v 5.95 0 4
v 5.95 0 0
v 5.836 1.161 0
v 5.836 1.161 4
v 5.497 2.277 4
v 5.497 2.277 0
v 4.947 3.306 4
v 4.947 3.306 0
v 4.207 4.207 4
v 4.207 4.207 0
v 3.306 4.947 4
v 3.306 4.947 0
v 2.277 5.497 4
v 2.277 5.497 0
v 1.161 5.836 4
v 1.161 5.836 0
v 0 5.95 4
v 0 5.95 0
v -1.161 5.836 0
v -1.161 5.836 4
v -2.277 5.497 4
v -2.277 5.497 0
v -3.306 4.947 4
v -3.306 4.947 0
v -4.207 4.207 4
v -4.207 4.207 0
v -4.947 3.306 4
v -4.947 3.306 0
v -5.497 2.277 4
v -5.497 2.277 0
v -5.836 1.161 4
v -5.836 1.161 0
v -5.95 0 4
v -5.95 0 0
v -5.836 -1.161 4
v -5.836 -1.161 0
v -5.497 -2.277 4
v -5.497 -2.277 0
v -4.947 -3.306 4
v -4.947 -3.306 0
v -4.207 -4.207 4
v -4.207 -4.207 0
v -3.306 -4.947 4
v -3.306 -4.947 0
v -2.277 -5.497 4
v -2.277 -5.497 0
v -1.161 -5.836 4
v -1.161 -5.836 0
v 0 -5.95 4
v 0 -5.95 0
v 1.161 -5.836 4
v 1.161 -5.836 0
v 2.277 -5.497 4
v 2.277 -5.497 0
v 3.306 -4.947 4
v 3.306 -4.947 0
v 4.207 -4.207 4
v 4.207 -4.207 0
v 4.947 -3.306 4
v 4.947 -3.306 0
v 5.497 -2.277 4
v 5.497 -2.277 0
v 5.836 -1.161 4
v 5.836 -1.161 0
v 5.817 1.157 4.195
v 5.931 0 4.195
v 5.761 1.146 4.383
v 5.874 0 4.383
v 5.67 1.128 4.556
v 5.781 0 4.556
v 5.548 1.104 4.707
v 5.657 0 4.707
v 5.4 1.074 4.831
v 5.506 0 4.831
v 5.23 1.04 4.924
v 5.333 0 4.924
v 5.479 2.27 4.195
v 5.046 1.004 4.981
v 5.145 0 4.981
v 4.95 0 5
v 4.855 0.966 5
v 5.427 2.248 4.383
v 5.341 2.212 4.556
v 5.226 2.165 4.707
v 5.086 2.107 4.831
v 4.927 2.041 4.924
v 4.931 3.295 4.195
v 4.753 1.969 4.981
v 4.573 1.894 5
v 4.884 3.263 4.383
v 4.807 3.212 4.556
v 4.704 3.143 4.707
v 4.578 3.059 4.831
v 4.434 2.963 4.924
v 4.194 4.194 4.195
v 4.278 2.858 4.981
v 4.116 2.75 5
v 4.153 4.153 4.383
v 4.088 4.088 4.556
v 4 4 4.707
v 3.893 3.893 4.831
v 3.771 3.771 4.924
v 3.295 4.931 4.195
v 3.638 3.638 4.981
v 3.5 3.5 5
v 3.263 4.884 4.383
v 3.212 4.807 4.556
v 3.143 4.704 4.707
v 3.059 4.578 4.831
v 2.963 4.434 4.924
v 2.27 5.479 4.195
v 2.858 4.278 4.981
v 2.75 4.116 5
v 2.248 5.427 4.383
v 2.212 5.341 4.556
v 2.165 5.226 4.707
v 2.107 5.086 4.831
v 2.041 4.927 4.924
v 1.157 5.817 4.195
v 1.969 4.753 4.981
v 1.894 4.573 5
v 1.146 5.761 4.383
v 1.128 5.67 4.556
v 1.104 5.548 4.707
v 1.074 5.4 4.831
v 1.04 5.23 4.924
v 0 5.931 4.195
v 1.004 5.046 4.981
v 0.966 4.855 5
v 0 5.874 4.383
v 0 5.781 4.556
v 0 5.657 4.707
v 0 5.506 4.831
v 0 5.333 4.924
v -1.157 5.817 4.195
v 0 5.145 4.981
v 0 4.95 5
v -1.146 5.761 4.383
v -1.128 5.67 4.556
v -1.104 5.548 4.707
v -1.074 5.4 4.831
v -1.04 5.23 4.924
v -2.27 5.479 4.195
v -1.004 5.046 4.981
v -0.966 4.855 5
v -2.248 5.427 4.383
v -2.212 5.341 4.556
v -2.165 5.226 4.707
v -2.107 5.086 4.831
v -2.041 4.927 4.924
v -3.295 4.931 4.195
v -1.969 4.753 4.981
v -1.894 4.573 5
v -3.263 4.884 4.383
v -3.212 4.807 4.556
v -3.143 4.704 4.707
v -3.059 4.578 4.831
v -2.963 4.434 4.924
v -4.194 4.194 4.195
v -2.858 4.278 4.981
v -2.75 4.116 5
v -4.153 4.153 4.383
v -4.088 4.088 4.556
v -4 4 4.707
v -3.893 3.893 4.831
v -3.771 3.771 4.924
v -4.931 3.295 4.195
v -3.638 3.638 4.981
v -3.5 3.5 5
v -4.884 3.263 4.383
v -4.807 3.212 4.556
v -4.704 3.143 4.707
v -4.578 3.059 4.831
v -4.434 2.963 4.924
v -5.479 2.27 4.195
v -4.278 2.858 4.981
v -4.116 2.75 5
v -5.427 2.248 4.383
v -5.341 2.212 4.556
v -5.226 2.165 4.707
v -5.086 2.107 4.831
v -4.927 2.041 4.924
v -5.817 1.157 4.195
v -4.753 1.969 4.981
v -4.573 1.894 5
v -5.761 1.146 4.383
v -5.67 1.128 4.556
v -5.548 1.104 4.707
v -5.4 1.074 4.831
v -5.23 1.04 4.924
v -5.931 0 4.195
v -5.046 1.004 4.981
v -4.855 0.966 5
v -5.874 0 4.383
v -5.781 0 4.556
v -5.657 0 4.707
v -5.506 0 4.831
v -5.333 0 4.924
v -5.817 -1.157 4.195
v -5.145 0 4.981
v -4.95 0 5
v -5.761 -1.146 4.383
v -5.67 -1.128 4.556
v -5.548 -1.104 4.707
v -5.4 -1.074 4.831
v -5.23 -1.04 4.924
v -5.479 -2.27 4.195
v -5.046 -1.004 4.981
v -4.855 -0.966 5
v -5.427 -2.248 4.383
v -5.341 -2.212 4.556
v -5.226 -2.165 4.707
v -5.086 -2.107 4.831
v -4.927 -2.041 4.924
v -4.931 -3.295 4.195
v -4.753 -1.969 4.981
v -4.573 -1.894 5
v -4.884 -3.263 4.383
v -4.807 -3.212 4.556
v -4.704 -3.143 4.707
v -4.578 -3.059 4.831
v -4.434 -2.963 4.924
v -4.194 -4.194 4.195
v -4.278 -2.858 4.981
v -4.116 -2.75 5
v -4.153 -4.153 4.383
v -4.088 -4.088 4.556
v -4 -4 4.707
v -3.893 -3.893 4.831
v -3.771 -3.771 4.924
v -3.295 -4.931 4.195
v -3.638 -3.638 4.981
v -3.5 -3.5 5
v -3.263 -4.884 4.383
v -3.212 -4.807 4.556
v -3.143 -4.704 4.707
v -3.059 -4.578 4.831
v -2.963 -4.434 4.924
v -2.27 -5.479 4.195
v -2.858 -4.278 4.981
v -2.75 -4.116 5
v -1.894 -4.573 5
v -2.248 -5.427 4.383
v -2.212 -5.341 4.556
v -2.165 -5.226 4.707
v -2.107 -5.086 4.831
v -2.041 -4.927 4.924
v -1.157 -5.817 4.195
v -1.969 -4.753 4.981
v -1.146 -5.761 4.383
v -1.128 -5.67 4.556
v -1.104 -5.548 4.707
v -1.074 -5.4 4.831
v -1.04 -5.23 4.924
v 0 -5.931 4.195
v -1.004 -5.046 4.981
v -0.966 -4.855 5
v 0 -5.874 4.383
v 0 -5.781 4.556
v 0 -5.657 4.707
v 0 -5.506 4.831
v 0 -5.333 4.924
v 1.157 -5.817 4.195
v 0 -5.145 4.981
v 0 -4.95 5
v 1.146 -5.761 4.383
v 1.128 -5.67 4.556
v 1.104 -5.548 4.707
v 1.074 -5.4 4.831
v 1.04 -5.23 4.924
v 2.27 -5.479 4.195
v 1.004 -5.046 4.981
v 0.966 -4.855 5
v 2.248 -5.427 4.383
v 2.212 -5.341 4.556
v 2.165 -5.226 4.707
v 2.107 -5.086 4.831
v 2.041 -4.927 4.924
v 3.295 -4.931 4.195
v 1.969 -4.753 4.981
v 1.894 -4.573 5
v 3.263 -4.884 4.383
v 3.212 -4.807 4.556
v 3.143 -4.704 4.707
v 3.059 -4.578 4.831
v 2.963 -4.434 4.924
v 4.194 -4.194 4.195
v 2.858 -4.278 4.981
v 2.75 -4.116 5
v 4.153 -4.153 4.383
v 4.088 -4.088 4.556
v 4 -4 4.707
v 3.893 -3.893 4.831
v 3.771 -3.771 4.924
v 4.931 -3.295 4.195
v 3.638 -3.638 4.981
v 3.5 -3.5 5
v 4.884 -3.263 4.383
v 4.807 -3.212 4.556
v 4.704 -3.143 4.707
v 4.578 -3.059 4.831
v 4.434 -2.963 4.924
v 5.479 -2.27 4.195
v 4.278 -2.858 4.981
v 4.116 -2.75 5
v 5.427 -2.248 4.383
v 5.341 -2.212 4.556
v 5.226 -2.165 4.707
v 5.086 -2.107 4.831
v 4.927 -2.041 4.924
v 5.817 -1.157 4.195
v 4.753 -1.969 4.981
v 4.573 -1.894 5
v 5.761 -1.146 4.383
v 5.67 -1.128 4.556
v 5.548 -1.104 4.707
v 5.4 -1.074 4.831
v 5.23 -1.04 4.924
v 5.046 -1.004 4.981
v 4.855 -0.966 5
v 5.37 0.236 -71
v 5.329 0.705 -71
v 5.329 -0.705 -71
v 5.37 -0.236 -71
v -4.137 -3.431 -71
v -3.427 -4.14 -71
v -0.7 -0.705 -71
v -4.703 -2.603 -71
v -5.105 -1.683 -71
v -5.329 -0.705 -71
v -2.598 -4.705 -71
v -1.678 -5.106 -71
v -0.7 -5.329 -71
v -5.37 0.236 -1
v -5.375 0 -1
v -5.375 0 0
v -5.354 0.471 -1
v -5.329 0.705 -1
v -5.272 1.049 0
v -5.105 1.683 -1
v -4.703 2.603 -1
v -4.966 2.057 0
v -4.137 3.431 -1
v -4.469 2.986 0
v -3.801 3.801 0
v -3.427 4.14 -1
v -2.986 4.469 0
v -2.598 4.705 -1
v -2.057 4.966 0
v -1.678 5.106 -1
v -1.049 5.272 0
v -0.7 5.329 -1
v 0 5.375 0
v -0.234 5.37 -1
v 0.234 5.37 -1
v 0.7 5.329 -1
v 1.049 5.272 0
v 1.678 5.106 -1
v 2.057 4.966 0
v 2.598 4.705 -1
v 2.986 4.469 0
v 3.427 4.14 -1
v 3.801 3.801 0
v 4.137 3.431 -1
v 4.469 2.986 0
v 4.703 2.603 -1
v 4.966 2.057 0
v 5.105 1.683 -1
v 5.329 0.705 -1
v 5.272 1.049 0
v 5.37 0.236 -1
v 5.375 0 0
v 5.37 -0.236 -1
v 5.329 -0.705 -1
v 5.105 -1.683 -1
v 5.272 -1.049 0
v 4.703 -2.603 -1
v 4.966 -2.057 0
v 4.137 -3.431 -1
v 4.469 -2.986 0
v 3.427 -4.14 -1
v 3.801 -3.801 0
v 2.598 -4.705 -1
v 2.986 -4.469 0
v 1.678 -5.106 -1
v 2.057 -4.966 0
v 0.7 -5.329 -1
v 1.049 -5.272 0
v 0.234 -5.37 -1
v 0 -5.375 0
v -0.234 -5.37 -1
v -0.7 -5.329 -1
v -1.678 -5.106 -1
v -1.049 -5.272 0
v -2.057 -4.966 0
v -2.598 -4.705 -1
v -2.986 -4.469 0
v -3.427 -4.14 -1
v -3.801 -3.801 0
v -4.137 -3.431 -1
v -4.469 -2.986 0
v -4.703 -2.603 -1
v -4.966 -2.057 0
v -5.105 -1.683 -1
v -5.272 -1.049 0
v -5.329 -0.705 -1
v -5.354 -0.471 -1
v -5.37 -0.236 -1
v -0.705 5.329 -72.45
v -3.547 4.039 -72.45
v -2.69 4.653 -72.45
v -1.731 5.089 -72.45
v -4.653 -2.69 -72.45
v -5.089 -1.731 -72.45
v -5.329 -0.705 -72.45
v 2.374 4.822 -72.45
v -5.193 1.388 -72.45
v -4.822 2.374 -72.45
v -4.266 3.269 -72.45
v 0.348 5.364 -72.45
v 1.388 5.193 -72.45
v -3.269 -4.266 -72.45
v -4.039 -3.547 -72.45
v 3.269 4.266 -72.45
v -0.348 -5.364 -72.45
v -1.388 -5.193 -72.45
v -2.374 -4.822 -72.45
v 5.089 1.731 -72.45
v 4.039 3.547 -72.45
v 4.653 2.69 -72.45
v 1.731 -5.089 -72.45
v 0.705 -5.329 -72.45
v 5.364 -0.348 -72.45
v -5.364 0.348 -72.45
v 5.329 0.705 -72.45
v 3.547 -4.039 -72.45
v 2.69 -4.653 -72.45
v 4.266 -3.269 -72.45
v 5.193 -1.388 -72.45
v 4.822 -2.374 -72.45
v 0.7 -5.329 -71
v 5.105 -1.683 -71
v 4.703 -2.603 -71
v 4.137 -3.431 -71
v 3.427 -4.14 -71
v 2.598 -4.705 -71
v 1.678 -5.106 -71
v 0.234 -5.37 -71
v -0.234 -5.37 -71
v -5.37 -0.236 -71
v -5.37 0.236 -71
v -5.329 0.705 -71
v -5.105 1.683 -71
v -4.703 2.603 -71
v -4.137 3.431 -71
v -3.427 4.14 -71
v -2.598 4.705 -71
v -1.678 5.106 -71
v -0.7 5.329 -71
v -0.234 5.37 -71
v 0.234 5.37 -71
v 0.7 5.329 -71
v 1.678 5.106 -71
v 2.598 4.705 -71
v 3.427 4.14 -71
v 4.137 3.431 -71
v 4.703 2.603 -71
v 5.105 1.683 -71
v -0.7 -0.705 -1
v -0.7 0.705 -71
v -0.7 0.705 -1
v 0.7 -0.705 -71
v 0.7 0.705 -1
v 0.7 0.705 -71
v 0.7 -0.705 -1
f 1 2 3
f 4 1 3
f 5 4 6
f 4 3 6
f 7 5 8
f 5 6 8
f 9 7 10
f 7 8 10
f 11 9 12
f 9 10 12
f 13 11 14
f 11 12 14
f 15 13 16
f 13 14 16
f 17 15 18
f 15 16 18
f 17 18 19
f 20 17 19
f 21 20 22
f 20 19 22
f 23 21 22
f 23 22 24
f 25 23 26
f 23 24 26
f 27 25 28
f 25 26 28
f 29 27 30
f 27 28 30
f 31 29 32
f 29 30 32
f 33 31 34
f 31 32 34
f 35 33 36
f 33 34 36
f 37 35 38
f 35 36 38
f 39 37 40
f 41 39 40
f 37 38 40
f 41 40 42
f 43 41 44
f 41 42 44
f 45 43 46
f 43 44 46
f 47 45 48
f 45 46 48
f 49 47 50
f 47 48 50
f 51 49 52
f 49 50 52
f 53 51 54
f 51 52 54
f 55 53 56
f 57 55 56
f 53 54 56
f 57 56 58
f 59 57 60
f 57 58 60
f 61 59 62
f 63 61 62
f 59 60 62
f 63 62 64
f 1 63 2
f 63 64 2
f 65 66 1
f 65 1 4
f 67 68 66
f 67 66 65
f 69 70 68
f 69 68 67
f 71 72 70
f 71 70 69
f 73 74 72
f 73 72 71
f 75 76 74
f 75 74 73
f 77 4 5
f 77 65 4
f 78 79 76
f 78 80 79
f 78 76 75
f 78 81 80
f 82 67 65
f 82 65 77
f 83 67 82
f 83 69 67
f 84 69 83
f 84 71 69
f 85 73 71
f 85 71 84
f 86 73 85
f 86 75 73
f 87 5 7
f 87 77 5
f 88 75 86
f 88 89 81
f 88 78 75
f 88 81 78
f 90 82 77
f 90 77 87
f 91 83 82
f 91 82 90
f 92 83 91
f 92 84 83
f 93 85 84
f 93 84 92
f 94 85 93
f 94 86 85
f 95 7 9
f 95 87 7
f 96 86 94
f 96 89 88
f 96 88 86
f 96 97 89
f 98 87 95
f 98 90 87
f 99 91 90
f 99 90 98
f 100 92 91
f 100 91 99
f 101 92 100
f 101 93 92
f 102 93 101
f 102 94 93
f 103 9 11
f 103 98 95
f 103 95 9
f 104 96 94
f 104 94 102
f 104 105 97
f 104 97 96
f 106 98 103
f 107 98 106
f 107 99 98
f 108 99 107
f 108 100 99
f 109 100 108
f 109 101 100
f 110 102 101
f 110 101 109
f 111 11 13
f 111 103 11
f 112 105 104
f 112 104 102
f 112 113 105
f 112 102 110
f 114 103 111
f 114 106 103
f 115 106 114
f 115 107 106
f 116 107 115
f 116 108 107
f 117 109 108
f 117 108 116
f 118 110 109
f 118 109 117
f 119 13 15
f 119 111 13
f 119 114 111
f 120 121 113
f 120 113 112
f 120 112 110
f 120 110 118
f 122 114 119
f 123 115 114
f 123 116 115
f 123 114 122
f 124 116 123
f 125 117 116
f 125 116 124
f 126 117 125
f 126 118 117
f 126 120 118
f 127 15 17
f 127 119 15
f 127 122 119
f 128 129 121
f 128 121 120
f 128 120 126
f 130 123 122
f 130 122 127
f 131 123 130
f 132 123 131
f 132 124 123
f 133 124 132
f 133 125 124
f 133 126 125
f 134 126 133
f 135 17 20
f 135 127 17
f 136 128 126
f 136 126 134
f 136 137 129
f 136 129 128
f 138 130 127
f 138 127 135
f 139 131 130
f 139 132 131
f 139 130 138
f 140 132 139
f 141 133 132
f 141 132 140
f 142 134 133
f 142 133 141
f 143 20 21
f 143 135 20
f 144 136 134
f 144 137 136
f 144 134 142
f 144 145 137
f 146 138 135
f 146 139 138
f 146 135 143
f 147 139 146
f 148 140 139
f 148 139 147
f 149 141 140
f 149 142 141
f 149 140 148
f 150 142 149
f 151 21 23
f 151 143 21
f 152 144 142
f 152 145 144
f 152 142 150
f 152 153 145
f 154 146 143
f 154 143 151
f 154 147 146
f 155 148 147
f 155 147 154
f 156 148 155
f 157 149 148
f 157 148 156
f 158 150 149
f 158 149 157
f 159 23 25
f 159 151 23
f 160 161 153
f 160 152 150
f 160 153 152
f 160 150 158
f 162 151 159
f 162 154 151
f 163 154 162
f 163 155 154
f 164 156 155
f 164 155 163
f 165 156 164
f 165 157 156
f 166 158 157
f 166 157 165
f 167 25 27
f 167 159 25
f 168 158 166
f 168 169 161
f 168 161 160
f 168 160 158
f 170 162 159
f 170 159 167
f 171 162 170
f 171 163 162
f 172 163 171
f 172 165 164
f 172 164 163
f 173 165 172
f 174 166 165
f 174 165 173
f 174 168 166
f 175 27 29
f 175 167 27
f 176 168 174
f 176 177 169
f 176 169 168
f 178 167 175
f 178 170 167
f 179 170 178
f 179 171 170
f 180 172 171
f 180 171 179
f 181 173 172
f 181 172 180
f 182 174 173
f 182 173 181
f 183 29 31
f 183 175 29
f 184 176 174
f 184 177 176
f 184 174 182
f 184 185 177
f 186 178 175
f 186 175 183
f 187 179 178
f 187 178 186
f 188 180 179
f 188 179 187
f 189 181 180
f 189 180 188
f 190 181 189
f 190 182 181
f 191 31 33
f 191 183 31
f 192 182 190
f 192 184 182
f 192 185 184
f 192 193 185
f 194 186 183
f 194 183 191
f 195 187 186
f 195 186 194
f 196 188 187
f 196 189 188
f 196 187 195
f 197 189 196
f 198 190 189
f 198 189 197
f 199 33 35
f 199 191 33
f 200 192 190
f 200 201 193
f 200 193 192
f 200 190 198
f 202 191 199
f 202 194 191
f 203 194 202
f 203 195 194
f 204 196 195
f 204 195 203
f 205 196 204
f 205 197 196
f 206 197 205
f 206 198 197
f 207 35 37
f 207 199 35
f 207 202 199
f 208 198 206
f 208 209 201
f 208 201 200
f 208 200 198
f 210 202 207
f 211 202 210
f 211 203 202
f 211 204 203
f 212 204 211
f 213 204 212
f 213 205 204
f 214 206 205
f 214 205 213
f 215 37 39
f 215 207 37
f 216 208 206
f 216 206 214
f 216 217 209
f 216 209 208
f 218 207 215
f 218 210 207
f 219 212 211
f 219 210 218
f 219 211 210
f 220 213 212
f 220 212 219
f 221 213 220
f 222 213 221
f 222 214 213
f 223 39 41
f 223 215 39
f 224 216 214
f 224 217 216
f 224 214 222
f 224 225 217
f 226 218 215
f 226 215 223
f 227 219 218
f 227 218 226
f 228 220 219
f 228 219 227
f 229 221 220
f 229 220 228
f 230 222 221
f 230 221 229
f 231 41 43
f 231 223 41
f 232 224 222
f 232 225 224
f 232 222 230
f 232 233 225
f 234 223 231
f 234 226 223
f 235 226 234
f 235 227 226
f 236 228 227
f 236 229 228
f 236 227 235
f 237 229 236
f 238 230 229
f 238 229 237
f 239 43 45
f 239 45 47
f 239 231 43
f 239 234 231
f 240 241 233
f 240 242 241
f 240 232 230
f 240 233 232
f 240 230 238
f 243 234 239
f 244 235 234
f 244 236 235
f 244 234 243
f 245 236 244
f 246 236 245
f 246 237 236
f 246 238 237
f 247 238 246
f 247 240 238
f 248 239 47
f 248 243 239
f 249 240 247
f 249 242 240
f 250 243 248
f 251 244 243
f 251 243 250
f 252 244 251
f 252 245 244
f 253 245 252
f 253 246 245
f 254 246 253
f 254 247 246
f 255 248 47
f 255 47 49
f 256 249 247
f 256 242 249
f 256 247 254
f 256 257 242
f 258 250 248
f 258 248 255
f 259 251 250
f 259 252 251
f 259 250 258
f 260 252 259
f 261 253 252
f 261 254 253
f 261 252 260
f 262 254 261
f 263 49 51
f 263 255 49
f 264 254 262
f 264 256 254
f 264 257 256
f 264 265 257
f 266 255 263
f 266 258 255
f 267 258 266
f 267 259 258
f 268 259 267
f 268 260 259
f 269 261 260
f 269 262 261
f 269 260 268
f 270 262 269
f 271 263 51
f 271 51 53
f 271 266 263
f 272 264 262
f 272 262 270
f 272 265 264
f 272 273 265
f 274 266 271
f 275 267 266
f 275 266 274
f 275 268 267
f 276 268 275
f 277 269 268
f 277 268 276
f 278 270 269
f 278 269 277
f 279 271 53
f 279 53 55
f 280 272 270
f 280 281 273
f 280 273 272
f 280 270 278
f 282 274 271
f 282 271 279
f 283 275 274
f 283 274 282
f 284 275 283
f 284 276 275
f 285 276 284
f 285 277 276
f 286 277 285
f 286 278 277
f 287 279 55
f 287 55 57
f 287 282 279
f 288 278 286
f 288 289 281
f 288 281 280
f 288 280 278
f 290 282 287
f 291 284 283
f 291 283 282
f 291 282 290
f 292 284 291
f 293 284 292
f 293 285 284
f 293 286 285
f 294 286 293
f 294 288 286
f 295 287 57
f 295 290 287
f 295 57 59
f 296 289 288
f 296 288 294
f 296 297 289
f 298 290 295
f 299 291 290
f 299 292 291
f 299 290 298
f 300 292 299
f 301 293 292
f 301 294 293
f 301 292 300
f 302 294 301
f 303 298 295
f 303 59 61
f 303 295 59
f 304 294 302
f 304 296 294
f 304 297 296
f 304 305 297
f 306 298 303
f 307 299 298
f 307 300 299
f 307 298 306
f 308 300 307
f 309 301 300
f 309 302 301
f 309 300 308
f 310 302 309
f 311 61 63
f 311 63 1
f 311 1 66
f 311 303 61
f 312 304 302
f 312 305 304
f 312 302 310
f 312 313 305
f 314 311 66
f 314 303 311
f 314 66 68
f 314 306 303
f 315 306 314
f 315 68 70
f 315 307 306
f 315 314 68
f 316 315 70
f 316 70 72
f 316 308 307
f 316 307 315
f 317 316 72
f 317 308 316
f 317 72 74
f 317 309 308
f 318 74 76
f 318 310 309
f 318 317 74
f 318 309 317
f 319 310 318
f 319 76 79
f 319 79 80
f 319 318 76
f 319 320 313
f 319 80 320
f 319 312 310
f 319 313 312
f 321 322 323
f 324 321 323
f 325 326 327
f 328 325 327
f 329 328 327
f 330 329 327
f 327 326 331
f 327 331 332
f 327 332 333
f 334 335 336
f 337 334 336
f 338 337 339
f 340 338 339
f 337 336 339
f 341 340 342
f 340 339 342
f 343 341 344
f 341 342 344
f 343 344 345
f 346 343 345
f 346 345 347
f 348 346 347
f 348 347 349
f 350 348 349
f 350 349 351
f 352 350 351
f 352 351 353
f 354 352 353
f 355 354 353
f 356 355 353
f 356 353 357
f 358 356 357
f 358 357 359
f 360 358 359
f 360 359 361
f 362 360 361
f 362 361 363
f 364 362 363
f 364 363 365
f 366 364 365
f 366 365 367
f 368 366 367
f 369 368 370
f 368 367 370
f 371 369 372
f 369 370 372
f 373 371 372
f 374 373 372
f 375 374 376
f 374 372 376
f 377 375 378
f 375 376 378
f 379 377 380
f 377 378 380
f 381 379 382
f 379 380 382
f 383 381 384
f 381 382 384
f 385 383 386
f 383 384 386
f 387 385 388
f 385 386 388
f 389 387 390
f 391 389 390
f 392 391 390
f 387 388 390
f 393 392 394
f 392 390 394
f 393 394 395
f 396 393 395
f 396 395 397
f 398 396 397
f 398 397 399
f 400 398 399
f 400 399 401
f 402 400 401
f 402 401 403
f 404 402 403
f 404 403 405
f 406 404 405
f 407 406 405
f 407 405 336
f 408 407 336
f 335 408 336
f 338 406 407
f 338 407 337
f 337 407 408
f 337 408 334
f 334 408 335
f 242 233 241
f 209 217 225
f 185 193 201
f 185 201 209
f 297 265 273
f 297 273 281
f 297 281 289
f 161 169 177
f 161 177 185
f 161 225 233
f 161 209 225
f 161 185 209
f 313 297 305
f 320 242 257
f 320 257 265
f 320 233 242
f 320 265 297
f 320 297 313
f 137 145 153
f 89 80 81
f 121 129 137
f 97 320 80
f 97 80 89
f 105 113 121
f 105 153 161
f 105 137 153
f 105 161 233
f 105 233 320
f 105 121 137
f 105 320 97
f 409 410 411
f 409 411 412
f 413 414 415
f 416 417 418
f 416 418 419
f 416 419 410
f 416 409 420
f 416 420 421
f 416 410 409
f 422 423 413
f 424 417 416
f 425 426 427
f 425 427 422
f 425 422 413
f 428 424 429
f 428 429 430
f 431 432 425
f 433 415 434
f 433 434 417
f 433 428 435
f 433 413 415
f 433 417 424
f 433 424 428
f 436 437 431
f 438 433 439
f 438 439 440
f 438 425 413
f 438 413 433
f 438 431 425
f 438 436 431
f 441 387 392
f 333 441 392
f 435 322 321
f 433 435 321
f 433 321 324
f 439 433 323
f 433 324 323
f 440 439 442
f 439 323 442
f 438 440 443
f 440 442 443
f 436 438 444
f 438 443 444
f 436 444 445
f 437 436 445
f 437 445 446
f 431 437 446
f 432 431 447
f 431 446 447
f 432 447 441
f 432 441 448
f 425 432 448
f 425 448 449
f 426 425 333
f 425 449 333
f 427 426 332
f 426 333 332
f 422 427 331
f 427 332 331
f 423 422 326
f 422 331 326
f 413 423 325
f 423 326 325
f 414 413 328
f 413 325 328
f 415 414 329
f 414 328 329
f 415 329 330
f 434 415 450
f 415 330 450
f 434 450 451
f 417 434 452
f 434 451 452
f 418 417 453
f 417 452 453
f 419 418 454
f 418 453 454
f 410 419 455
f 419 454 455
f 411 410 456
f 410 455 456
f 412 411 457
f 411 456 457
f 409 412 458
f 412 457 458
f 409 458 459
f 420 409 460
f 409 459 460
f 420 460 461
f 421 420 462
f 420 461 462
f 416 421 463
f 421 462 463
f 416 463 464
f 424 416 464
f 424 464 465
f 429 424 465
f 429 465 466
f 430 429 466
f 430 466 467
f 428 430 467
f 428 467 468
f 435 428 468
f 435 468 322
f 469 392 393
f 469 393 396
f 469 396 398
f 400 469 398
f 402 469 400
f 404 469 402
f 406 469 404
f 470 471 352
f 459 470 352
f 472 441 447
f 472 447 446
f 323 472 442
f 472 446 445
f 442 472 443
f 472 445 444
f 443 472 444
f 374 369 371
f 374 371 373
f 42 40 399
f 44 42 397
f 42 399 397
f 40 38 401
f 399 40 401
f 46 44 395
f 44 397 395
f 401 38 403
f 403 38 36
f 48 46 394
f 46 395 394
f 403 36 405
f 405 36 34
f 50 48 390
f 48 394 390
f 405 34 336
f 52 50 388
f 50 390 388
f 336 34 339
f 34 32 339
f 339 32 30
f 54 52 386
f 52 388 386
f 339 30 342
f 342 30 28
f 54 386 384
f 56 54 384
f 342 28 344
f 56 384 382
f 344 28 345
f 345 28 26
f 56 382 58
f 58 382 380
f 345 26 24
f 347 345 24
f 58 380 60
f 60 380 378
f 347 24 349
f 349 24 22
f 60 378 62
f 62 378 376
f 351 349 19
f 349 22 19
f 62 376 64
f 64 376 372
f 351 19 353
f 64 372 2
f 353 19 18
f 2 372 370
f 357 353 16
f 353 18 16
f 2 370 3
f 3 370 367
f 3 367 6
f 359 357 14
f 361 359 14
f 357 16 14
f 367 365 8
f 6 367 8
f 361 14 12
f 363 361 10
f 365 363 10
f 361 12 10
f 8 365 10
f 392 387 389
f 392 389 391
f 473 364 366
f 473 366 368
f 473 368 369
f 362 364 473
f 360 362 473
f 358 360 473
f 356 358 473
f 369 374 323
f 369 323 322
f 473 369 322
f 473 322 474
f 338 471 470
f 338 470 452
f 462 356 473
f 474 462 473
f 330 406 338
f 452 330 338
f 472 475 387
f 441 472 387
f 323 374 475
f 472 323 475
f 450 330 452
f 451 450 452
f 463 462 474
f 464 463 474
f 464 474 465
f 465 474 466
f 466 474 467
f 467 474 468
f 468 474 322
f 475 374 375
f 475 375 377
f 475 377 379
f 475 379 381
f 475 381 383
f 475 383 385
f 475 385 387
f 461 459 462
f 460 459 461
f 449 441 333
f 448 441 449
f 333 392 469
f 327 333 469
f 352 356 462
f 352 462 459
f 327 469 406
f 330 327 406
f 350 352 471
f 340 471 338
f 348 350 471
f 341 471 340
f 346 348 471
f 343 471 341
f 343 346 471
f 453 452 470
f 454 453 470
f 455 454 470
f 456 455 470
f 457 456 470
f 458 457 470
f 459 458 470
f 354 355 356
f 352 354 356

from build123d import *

# Parameters (mm, degrees)
CROQUIS1_R              = 5.95
SALIENTE_EXTRUIR1_DEPTH = 5
CROQUIS2_R              = 5.375
SALIENTE_EXTRUIR2_DEPTH = 1
CROQUIS4_W              = 1.4
CROQUIS4_H              = 4.624223677
CROQUIS4_H_2            = 1.41
CROQUIS4_W_2            = 4.628564535
SALIENTE_EXTRUIR3_DEPTH = 70
REDONDEO1_R             = 1
CROQUIS5_R              = 5.375
SALIENTE_EXTRUIR4_DEPTH = 1.45


with BuildPart() as part:
    # Croquis1 → Saliente-Extruir1 (new body)
    with BuildSketch(Plane.XY):
        Circle(CROQUIS1_R)
    extrude(amount=SALIENTE_EXTRUIR1_DEPTH)

    # Croquis2 → Saliente-Extruir2 (add)
    with BuildSketch(Plane(origin=(0, 0, 0), x_dir=(-1, 0, 0), z_dir=(0, 0, -1))):
        Circle(CROQUIS2_R)
    extrude(amount=SALIENTE_EXTRUIR2_DEPTH)

    # Croquis4 → Saliente-Extruir3 (add)
    with BuildSketch(Plane(origin=(0, 0, -1), x_dir=(-1, 0, 0), z_dir=(0, 0, -1))):
        with Locations((0, 3.017111839)):
            Rectangle(CROQUIS4_W, CROQUIS4_H)
        Rectangle(CROQUIS4_W, CROQUIS4_H_2)
        with Locations((0, -3.017111839)):
            Rectangle(CROQUIS4_W, CROQUIS4_H)
        with Locations((-3.014282268, 0)):
            Rectangle(CROQUIS4_W_2, CROQUIS4_H_2)
        with Locations((3.014282268, 0)):
            Rectangle(CROQUIS4_W_2, CROQUIS4_H_2)
    extrude(amount=SALIENTE_EXTRUIR3_DEPTH)

    # Redondeo1
    redondeo1_edges = [part.edges().sort_by_distance(p)[0] for p in [
        (-5.95, 0, 5),
    ]]
    fillet(redondeo1_edges, radius=REDONDEO1_R)

    # Croquis5 → Saliente-Extruir4 (add)
    with BuildSketch(Plane(origin=(0, 0, -71), x_dir=(-1, 0, 0), z_dir=(0, 0, -1))):
        with Locations(Location((0, 0, 0), (0, 0, 172.4632093))):
            Circle(CROQUIS5_R)
    extrude(amount=SALIENTE_EXTRUIR4_DEPTH)


solid = part.part
